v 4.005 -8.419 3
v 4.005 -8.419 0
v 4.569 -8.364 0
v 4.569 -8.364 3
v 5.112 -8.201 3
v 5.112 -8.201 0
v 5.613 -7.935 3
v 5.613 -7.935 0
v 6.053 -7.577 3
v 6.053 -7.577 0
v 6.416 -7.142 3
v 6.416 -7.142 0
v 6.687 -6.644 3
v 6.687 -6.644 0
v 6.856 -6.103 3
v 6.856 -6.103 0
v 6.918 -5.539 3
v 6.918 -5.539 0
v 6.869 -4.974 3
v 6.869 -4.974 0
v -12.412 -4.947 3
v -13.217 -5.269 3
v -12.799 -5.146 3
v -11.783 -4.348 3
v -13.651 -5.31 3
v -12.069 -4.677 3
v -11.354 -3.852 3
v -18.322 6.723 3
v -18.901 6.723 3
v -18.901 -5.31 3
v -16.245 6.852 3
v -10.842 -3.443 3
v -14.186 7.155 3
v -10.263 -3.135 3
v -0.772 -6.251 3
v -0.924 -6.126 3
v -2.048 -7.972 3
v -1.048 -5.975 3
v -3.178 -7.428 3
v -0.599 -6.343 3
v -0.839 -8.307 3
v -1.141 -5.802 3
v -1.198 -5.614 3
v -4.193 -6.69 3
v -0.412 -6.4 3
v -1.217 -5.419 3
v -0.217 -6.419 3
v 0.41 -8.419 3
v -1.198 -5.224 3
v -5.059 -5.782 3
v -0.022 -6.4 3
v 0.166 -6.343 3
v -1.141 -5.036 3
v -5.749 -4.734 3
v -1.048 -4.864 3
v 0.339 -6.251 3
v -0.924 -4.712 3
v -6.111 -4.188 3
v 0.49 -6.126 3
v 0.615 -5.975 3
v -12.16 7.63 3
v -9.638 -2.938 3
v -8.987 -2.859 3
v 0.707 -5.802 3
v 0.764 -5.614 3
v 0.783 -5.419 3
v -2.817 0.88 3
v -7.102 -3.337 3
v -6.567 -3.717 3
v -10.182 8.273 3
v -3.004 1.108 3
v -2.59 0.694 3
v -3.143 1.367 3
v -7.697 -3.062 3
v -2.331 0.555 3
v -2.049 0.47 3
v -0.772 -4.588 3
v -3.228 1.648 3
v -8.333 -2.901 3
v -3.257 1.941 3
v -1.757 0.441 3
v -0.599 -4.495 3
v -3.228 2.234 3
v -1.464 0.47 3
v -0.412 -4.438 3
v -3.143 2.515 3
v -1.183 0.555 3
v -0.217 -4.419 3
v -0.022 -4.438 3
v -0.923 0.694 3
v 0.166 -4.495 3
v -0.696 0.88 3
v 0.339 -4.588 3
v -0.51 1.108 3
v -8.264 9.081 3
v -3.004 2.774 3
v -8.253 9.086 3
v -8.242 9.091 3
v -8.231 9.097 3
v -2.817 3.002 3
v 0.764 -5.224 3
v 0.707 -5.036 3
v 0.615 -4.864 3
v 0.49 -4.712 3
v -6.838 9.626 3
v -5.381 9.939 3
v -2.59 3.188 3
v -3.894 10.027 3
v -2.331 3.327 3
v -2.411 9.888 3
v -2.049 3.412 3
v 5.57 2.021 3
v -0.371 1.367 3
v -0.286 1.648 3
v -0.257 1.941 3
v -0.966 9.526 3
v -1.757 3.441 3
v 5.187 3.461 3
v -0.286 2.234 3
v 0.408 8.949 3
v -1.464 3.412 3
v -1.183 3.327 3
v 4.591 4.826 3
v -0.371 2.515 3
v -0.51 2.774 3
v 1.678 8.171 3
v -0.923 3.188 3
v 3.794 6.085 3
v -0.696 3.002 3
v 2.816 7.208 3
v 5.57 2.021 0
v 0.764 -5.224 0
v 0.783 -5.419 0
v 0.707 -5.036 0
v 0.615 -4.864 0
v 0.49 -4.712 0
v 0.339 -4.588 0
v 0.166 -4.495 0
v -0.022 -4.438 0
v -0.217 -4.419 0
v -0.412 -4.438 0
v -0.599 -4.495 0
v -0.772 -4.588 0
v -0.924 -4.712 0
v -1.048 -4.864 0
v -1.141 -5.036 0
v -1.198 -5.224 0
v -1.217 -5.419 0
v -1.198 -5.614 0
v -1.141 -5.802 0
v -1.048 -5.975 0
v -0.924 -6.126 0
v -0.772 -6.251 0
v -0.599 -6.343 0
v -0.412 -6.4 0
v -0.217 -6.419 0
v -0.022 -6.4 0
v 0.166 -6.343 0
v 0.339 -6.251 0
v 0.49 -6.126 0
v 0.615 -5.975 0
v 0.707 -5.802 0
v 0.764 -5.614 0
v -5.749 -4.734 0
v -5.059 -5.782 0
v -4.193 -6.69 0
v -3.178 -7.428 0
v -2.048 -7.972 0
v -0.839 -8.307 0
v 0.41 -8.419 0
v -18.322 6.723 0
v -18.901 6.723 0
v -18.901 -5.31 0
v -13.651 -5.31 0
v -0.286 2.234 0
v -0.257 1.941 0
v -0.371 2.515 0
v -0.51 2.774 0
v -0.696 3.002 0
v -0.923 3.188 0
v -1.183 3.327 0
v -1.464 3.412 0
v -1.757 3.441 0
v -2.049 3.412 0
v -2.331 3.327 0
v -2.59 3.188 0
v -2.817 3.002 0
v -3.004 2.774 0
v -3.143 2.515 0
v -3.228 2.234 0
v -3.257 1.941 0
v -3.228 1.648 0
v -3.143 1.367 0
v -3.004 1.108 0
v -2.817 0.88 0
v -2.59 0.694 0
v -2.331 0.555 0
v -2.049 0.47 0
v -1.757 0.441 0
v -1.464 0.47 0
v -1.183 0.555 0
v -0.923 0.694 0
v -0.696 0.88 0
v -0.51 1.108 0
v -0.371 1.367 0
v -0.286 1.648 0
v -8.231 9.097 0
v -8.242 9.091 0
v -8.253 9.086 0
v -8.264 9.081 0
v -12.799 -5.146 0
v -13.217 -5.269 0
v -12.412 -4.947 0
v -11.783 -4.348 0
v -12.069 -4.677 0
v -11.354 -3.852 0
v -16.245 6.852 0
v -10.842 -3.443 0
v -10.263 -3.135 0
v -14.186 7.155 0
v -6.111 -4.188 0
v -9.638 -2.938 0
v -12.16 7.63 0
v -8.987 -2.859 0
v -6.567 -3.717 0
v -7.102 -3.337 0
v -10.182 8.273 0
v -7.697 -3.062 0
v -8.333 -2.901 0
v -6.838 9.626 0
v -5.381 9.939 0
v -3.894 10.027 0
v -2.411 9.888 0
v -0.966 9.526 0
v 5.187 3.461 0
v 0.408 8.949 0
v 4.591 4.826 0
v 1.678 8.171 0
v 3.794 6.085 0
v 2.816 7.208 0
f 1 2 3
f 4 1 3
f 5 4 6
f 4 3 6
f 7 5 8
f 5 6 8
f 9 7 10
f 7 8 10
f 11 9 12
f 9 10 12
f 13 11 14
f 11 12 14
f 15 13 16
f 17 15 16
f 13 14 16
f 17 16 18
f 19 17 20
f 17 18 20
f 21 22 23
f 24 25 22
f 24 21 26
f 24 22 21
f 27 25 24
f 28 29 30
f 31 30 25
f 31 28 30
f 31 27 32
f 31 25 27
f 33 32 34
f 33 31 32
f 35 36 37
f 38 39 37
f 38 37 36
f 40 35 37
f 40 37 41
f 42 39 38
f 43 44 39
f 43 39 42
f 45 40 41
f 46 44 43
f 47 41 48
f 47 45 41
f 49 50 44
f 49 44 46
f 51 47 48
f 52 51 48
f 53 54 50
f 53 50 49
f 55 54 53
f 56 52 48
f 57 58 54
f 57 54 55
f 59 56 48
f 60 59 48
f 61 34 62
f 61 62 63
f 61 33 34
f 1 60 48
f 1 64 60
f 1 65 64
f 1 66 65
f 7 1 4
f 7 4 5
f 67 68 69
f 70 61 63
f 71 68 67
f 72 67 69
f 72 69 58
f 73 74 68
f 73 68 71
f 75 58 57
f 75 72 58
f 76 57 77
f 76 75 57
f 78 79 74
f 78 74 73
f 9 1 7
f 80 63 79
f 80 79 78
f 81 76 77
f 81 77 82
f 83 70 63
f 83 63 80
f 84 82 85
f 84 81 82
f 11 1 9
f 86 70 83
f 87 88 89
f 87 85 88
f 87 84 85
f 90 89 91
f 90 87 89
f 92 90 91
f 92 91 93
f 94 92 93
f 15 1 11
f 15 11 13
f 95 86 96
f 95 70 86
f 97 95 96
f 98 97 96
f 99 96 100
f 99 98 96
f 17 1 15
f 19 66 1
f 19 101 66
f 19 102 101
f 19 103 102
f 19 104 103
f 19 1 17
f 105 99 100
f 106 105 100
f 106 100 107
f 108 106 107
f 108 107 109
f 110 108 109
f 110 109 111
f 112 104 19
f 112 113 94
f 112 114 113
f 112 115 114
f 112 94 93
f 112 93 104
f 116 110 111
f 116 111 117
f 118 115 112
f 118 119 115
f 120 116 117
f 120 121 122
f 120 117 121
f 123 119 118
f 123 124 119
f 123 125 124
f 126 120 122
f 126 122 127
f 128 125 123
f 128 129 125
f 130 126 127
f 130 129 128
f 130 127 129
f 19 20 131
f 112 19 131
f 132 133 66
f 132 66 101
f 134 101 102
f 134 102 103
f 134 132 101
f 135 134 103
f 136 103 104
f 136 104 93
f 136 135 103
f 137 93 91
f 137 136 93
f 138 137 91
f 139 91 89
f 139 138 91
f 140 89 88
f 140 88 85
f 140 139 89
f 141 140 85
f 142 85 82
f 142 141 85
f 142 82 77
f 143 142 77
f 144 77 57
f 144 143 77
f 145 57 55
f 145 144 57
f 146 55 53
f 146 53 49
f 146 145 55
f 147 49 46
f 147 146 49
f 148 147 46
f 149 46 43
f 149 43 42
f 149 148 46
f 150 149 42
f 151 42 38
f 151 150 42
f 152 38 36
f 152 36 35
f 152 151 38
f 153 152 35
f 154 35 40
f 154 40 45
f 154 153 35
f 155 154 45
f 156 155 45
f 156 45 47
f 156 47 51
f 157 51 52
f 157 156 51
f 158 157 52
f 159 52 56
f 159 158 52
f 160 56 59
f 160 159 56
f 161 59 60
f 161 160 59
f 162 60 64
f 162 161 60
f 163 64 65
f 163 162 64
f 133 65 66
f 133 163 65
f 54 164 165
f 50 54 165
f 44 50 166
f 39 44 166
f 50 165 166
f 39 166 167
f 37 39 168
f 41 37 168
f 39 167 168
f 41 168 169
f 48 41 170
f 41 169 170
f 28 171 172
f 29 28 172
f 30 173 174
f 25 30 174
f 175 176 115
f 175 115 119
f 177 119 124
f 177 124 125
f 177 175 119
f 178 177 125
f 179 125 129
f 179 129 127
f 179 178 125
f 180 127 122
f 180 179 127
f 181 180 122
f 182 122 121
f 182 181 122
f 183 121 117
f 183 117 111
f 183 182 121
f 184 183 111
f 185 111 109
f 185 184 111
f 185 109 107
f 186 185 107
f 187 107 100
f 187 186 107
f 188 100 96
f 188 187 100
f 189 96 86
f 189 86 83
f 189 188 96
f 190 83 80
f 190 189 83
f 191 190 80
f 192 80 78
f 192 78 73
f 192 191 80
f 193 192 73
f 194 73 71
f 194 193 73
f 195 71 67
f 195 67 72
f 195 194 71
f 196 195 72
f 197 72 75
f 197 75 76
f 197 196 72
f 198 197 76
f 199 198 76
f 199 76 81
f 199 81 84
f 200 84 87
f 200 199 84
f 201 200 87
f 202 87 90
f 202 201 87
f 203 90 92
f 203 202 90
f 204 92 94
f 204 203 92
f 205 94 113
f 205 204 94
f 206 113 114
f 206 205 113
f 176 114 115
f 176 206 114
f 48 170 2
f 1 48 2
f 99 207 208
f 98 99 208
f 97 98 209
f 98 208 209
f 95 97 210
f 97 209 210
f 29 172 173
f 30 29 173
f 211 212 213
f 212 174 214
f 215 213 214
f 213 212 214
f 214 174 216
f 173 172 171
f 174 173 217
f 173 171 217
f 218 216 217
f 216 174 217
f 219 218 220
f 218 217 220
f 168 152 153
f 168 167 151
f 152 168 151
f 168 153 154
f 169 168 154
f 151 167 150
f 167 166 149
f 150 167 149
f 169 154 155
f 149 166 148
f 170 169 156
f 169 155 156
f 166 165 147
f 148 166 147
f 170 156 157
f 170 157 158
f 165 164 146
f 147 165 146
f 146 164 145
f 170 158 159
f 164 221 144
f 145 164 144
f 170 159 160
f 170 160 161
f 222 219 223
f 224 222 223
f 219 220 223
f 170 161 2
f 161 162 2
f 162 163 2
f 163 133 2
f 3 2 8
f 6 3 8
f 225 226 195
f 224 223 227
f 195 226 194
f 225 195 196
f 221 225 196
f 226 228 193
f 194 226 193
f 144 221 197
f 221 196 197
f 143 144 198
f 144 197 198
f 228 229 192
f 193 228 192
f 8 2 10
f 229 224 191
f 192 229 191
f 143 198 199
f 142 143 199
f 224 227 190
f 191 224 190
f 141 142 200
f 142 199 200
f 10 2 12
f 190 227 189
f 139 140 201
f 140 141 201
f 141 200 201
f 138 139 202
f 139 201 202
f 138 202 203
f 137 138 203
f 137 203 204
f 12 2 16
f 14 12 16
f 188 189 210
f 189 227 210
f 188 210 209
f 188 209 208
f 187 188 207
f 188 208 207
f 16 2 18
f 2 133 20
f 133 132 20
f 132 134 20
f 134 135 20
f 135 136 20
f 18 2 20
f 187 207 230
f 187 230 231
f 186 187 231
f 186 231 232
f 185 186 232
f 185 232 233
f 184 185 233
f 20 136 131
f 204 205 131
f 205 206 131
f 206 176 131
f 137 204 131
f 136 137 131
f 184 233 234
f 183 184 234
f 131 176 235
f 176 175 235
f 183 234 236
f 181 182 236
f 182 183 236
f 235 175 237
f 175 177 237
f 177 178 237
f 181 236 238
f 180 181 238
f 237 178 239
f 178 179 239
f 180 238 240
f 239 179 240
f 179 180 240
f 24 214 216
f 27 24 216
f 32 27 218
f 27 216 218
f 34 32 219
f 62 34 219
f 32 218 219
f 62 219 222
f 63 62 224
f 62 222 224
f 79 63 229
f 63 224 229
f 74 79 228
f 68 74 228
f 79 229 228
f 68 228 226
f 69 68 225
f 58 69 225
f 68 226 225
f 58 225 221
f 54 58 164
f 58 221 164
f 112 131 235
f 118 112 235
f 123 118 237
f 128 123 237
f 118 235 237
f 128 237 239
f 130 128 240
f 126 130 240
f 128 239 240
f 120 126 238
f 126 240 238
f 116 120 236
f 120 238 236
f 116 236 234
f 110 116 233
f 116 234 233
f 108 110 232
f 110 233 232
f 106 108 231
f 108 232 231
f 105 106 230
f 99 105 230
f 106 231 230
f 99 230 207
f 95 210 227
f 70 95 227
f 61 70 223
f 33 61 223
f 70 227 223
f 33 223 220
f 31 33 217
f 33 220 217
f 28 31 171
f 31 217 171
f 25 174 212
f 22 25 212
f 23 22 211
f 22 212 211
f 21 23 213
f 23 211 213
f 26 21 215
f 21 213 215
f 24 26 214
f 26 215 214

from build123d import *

# Parameters (mm, degrees)
SKETCH1_R           = 1
SKETCH1_R_2         = 1.5
BOSS_EXTRUDE1_DEPTH = 3


with BuildPart() as part:
    # Sketch1 → Boss-Extrude1 (new body)
    with BuildSketch(Plane.XY):
        with BuildLine():
            Line((6.869152375, -4.974037541), (5.570032573, 2.020702591))
            ThreePointArc((5.570032573, 2.020702591), (0.408013999, 8.949092219), (-8.230691413, 9.096697763))
            ThreePointArc((-8.230691413, 9.096697763), (-8.247364434, 9.088837268), (-8.264022634, 9.080945414))
            ThreePointArc((-8.264022634, 9.080945414), (-13.168452035, 7.370807944), (-18.321933974, 6.723025711))
            Line((-18.321933974, 6.723025711), (-18.900934286, 6.723025711))
            Line((-18.900934286, 6.723025711), (-18.900934286, -5.309936566))
            Line((-18.900934286, -5.309936566), (-13.651422395, -5.309936566))
            ThreePointArc((-13.651422395, -5.309936566), (-12.600650913, -5.055458479), (-11.78274174, -4.34841931))
            ThreePointArc((-11.78274174, -4.34841931), (-8.658711941, -2.8651804), (-5.749146129, -4.734401261))
            ThreePointArc((-5.749146129, -4.734401261), (-3.178332185, -7.427632658), (0.410473142, -8.419124472))
            Line((0.410473142, -8.419124472), (4.004999648, -8.419124472))
            ThreePointArc((4.004999648, -8.419124472), (6.245088642, -7.368341001), (6.869152375, -4.974037541))
        make_face()
        with Locations((-0.216717362, -5.419124472)):
            Circle(SKETCH1_R, mode=Mode.SUBTRACT)
        with Locations((-1.756717362, 1.940875528)):
            Circle(SKETCH1_R_2, mode=Mode.SUBTRACT)
    extrude(amount=BOSS_EXTRUDE1_DEPTH)


solid = part.part
